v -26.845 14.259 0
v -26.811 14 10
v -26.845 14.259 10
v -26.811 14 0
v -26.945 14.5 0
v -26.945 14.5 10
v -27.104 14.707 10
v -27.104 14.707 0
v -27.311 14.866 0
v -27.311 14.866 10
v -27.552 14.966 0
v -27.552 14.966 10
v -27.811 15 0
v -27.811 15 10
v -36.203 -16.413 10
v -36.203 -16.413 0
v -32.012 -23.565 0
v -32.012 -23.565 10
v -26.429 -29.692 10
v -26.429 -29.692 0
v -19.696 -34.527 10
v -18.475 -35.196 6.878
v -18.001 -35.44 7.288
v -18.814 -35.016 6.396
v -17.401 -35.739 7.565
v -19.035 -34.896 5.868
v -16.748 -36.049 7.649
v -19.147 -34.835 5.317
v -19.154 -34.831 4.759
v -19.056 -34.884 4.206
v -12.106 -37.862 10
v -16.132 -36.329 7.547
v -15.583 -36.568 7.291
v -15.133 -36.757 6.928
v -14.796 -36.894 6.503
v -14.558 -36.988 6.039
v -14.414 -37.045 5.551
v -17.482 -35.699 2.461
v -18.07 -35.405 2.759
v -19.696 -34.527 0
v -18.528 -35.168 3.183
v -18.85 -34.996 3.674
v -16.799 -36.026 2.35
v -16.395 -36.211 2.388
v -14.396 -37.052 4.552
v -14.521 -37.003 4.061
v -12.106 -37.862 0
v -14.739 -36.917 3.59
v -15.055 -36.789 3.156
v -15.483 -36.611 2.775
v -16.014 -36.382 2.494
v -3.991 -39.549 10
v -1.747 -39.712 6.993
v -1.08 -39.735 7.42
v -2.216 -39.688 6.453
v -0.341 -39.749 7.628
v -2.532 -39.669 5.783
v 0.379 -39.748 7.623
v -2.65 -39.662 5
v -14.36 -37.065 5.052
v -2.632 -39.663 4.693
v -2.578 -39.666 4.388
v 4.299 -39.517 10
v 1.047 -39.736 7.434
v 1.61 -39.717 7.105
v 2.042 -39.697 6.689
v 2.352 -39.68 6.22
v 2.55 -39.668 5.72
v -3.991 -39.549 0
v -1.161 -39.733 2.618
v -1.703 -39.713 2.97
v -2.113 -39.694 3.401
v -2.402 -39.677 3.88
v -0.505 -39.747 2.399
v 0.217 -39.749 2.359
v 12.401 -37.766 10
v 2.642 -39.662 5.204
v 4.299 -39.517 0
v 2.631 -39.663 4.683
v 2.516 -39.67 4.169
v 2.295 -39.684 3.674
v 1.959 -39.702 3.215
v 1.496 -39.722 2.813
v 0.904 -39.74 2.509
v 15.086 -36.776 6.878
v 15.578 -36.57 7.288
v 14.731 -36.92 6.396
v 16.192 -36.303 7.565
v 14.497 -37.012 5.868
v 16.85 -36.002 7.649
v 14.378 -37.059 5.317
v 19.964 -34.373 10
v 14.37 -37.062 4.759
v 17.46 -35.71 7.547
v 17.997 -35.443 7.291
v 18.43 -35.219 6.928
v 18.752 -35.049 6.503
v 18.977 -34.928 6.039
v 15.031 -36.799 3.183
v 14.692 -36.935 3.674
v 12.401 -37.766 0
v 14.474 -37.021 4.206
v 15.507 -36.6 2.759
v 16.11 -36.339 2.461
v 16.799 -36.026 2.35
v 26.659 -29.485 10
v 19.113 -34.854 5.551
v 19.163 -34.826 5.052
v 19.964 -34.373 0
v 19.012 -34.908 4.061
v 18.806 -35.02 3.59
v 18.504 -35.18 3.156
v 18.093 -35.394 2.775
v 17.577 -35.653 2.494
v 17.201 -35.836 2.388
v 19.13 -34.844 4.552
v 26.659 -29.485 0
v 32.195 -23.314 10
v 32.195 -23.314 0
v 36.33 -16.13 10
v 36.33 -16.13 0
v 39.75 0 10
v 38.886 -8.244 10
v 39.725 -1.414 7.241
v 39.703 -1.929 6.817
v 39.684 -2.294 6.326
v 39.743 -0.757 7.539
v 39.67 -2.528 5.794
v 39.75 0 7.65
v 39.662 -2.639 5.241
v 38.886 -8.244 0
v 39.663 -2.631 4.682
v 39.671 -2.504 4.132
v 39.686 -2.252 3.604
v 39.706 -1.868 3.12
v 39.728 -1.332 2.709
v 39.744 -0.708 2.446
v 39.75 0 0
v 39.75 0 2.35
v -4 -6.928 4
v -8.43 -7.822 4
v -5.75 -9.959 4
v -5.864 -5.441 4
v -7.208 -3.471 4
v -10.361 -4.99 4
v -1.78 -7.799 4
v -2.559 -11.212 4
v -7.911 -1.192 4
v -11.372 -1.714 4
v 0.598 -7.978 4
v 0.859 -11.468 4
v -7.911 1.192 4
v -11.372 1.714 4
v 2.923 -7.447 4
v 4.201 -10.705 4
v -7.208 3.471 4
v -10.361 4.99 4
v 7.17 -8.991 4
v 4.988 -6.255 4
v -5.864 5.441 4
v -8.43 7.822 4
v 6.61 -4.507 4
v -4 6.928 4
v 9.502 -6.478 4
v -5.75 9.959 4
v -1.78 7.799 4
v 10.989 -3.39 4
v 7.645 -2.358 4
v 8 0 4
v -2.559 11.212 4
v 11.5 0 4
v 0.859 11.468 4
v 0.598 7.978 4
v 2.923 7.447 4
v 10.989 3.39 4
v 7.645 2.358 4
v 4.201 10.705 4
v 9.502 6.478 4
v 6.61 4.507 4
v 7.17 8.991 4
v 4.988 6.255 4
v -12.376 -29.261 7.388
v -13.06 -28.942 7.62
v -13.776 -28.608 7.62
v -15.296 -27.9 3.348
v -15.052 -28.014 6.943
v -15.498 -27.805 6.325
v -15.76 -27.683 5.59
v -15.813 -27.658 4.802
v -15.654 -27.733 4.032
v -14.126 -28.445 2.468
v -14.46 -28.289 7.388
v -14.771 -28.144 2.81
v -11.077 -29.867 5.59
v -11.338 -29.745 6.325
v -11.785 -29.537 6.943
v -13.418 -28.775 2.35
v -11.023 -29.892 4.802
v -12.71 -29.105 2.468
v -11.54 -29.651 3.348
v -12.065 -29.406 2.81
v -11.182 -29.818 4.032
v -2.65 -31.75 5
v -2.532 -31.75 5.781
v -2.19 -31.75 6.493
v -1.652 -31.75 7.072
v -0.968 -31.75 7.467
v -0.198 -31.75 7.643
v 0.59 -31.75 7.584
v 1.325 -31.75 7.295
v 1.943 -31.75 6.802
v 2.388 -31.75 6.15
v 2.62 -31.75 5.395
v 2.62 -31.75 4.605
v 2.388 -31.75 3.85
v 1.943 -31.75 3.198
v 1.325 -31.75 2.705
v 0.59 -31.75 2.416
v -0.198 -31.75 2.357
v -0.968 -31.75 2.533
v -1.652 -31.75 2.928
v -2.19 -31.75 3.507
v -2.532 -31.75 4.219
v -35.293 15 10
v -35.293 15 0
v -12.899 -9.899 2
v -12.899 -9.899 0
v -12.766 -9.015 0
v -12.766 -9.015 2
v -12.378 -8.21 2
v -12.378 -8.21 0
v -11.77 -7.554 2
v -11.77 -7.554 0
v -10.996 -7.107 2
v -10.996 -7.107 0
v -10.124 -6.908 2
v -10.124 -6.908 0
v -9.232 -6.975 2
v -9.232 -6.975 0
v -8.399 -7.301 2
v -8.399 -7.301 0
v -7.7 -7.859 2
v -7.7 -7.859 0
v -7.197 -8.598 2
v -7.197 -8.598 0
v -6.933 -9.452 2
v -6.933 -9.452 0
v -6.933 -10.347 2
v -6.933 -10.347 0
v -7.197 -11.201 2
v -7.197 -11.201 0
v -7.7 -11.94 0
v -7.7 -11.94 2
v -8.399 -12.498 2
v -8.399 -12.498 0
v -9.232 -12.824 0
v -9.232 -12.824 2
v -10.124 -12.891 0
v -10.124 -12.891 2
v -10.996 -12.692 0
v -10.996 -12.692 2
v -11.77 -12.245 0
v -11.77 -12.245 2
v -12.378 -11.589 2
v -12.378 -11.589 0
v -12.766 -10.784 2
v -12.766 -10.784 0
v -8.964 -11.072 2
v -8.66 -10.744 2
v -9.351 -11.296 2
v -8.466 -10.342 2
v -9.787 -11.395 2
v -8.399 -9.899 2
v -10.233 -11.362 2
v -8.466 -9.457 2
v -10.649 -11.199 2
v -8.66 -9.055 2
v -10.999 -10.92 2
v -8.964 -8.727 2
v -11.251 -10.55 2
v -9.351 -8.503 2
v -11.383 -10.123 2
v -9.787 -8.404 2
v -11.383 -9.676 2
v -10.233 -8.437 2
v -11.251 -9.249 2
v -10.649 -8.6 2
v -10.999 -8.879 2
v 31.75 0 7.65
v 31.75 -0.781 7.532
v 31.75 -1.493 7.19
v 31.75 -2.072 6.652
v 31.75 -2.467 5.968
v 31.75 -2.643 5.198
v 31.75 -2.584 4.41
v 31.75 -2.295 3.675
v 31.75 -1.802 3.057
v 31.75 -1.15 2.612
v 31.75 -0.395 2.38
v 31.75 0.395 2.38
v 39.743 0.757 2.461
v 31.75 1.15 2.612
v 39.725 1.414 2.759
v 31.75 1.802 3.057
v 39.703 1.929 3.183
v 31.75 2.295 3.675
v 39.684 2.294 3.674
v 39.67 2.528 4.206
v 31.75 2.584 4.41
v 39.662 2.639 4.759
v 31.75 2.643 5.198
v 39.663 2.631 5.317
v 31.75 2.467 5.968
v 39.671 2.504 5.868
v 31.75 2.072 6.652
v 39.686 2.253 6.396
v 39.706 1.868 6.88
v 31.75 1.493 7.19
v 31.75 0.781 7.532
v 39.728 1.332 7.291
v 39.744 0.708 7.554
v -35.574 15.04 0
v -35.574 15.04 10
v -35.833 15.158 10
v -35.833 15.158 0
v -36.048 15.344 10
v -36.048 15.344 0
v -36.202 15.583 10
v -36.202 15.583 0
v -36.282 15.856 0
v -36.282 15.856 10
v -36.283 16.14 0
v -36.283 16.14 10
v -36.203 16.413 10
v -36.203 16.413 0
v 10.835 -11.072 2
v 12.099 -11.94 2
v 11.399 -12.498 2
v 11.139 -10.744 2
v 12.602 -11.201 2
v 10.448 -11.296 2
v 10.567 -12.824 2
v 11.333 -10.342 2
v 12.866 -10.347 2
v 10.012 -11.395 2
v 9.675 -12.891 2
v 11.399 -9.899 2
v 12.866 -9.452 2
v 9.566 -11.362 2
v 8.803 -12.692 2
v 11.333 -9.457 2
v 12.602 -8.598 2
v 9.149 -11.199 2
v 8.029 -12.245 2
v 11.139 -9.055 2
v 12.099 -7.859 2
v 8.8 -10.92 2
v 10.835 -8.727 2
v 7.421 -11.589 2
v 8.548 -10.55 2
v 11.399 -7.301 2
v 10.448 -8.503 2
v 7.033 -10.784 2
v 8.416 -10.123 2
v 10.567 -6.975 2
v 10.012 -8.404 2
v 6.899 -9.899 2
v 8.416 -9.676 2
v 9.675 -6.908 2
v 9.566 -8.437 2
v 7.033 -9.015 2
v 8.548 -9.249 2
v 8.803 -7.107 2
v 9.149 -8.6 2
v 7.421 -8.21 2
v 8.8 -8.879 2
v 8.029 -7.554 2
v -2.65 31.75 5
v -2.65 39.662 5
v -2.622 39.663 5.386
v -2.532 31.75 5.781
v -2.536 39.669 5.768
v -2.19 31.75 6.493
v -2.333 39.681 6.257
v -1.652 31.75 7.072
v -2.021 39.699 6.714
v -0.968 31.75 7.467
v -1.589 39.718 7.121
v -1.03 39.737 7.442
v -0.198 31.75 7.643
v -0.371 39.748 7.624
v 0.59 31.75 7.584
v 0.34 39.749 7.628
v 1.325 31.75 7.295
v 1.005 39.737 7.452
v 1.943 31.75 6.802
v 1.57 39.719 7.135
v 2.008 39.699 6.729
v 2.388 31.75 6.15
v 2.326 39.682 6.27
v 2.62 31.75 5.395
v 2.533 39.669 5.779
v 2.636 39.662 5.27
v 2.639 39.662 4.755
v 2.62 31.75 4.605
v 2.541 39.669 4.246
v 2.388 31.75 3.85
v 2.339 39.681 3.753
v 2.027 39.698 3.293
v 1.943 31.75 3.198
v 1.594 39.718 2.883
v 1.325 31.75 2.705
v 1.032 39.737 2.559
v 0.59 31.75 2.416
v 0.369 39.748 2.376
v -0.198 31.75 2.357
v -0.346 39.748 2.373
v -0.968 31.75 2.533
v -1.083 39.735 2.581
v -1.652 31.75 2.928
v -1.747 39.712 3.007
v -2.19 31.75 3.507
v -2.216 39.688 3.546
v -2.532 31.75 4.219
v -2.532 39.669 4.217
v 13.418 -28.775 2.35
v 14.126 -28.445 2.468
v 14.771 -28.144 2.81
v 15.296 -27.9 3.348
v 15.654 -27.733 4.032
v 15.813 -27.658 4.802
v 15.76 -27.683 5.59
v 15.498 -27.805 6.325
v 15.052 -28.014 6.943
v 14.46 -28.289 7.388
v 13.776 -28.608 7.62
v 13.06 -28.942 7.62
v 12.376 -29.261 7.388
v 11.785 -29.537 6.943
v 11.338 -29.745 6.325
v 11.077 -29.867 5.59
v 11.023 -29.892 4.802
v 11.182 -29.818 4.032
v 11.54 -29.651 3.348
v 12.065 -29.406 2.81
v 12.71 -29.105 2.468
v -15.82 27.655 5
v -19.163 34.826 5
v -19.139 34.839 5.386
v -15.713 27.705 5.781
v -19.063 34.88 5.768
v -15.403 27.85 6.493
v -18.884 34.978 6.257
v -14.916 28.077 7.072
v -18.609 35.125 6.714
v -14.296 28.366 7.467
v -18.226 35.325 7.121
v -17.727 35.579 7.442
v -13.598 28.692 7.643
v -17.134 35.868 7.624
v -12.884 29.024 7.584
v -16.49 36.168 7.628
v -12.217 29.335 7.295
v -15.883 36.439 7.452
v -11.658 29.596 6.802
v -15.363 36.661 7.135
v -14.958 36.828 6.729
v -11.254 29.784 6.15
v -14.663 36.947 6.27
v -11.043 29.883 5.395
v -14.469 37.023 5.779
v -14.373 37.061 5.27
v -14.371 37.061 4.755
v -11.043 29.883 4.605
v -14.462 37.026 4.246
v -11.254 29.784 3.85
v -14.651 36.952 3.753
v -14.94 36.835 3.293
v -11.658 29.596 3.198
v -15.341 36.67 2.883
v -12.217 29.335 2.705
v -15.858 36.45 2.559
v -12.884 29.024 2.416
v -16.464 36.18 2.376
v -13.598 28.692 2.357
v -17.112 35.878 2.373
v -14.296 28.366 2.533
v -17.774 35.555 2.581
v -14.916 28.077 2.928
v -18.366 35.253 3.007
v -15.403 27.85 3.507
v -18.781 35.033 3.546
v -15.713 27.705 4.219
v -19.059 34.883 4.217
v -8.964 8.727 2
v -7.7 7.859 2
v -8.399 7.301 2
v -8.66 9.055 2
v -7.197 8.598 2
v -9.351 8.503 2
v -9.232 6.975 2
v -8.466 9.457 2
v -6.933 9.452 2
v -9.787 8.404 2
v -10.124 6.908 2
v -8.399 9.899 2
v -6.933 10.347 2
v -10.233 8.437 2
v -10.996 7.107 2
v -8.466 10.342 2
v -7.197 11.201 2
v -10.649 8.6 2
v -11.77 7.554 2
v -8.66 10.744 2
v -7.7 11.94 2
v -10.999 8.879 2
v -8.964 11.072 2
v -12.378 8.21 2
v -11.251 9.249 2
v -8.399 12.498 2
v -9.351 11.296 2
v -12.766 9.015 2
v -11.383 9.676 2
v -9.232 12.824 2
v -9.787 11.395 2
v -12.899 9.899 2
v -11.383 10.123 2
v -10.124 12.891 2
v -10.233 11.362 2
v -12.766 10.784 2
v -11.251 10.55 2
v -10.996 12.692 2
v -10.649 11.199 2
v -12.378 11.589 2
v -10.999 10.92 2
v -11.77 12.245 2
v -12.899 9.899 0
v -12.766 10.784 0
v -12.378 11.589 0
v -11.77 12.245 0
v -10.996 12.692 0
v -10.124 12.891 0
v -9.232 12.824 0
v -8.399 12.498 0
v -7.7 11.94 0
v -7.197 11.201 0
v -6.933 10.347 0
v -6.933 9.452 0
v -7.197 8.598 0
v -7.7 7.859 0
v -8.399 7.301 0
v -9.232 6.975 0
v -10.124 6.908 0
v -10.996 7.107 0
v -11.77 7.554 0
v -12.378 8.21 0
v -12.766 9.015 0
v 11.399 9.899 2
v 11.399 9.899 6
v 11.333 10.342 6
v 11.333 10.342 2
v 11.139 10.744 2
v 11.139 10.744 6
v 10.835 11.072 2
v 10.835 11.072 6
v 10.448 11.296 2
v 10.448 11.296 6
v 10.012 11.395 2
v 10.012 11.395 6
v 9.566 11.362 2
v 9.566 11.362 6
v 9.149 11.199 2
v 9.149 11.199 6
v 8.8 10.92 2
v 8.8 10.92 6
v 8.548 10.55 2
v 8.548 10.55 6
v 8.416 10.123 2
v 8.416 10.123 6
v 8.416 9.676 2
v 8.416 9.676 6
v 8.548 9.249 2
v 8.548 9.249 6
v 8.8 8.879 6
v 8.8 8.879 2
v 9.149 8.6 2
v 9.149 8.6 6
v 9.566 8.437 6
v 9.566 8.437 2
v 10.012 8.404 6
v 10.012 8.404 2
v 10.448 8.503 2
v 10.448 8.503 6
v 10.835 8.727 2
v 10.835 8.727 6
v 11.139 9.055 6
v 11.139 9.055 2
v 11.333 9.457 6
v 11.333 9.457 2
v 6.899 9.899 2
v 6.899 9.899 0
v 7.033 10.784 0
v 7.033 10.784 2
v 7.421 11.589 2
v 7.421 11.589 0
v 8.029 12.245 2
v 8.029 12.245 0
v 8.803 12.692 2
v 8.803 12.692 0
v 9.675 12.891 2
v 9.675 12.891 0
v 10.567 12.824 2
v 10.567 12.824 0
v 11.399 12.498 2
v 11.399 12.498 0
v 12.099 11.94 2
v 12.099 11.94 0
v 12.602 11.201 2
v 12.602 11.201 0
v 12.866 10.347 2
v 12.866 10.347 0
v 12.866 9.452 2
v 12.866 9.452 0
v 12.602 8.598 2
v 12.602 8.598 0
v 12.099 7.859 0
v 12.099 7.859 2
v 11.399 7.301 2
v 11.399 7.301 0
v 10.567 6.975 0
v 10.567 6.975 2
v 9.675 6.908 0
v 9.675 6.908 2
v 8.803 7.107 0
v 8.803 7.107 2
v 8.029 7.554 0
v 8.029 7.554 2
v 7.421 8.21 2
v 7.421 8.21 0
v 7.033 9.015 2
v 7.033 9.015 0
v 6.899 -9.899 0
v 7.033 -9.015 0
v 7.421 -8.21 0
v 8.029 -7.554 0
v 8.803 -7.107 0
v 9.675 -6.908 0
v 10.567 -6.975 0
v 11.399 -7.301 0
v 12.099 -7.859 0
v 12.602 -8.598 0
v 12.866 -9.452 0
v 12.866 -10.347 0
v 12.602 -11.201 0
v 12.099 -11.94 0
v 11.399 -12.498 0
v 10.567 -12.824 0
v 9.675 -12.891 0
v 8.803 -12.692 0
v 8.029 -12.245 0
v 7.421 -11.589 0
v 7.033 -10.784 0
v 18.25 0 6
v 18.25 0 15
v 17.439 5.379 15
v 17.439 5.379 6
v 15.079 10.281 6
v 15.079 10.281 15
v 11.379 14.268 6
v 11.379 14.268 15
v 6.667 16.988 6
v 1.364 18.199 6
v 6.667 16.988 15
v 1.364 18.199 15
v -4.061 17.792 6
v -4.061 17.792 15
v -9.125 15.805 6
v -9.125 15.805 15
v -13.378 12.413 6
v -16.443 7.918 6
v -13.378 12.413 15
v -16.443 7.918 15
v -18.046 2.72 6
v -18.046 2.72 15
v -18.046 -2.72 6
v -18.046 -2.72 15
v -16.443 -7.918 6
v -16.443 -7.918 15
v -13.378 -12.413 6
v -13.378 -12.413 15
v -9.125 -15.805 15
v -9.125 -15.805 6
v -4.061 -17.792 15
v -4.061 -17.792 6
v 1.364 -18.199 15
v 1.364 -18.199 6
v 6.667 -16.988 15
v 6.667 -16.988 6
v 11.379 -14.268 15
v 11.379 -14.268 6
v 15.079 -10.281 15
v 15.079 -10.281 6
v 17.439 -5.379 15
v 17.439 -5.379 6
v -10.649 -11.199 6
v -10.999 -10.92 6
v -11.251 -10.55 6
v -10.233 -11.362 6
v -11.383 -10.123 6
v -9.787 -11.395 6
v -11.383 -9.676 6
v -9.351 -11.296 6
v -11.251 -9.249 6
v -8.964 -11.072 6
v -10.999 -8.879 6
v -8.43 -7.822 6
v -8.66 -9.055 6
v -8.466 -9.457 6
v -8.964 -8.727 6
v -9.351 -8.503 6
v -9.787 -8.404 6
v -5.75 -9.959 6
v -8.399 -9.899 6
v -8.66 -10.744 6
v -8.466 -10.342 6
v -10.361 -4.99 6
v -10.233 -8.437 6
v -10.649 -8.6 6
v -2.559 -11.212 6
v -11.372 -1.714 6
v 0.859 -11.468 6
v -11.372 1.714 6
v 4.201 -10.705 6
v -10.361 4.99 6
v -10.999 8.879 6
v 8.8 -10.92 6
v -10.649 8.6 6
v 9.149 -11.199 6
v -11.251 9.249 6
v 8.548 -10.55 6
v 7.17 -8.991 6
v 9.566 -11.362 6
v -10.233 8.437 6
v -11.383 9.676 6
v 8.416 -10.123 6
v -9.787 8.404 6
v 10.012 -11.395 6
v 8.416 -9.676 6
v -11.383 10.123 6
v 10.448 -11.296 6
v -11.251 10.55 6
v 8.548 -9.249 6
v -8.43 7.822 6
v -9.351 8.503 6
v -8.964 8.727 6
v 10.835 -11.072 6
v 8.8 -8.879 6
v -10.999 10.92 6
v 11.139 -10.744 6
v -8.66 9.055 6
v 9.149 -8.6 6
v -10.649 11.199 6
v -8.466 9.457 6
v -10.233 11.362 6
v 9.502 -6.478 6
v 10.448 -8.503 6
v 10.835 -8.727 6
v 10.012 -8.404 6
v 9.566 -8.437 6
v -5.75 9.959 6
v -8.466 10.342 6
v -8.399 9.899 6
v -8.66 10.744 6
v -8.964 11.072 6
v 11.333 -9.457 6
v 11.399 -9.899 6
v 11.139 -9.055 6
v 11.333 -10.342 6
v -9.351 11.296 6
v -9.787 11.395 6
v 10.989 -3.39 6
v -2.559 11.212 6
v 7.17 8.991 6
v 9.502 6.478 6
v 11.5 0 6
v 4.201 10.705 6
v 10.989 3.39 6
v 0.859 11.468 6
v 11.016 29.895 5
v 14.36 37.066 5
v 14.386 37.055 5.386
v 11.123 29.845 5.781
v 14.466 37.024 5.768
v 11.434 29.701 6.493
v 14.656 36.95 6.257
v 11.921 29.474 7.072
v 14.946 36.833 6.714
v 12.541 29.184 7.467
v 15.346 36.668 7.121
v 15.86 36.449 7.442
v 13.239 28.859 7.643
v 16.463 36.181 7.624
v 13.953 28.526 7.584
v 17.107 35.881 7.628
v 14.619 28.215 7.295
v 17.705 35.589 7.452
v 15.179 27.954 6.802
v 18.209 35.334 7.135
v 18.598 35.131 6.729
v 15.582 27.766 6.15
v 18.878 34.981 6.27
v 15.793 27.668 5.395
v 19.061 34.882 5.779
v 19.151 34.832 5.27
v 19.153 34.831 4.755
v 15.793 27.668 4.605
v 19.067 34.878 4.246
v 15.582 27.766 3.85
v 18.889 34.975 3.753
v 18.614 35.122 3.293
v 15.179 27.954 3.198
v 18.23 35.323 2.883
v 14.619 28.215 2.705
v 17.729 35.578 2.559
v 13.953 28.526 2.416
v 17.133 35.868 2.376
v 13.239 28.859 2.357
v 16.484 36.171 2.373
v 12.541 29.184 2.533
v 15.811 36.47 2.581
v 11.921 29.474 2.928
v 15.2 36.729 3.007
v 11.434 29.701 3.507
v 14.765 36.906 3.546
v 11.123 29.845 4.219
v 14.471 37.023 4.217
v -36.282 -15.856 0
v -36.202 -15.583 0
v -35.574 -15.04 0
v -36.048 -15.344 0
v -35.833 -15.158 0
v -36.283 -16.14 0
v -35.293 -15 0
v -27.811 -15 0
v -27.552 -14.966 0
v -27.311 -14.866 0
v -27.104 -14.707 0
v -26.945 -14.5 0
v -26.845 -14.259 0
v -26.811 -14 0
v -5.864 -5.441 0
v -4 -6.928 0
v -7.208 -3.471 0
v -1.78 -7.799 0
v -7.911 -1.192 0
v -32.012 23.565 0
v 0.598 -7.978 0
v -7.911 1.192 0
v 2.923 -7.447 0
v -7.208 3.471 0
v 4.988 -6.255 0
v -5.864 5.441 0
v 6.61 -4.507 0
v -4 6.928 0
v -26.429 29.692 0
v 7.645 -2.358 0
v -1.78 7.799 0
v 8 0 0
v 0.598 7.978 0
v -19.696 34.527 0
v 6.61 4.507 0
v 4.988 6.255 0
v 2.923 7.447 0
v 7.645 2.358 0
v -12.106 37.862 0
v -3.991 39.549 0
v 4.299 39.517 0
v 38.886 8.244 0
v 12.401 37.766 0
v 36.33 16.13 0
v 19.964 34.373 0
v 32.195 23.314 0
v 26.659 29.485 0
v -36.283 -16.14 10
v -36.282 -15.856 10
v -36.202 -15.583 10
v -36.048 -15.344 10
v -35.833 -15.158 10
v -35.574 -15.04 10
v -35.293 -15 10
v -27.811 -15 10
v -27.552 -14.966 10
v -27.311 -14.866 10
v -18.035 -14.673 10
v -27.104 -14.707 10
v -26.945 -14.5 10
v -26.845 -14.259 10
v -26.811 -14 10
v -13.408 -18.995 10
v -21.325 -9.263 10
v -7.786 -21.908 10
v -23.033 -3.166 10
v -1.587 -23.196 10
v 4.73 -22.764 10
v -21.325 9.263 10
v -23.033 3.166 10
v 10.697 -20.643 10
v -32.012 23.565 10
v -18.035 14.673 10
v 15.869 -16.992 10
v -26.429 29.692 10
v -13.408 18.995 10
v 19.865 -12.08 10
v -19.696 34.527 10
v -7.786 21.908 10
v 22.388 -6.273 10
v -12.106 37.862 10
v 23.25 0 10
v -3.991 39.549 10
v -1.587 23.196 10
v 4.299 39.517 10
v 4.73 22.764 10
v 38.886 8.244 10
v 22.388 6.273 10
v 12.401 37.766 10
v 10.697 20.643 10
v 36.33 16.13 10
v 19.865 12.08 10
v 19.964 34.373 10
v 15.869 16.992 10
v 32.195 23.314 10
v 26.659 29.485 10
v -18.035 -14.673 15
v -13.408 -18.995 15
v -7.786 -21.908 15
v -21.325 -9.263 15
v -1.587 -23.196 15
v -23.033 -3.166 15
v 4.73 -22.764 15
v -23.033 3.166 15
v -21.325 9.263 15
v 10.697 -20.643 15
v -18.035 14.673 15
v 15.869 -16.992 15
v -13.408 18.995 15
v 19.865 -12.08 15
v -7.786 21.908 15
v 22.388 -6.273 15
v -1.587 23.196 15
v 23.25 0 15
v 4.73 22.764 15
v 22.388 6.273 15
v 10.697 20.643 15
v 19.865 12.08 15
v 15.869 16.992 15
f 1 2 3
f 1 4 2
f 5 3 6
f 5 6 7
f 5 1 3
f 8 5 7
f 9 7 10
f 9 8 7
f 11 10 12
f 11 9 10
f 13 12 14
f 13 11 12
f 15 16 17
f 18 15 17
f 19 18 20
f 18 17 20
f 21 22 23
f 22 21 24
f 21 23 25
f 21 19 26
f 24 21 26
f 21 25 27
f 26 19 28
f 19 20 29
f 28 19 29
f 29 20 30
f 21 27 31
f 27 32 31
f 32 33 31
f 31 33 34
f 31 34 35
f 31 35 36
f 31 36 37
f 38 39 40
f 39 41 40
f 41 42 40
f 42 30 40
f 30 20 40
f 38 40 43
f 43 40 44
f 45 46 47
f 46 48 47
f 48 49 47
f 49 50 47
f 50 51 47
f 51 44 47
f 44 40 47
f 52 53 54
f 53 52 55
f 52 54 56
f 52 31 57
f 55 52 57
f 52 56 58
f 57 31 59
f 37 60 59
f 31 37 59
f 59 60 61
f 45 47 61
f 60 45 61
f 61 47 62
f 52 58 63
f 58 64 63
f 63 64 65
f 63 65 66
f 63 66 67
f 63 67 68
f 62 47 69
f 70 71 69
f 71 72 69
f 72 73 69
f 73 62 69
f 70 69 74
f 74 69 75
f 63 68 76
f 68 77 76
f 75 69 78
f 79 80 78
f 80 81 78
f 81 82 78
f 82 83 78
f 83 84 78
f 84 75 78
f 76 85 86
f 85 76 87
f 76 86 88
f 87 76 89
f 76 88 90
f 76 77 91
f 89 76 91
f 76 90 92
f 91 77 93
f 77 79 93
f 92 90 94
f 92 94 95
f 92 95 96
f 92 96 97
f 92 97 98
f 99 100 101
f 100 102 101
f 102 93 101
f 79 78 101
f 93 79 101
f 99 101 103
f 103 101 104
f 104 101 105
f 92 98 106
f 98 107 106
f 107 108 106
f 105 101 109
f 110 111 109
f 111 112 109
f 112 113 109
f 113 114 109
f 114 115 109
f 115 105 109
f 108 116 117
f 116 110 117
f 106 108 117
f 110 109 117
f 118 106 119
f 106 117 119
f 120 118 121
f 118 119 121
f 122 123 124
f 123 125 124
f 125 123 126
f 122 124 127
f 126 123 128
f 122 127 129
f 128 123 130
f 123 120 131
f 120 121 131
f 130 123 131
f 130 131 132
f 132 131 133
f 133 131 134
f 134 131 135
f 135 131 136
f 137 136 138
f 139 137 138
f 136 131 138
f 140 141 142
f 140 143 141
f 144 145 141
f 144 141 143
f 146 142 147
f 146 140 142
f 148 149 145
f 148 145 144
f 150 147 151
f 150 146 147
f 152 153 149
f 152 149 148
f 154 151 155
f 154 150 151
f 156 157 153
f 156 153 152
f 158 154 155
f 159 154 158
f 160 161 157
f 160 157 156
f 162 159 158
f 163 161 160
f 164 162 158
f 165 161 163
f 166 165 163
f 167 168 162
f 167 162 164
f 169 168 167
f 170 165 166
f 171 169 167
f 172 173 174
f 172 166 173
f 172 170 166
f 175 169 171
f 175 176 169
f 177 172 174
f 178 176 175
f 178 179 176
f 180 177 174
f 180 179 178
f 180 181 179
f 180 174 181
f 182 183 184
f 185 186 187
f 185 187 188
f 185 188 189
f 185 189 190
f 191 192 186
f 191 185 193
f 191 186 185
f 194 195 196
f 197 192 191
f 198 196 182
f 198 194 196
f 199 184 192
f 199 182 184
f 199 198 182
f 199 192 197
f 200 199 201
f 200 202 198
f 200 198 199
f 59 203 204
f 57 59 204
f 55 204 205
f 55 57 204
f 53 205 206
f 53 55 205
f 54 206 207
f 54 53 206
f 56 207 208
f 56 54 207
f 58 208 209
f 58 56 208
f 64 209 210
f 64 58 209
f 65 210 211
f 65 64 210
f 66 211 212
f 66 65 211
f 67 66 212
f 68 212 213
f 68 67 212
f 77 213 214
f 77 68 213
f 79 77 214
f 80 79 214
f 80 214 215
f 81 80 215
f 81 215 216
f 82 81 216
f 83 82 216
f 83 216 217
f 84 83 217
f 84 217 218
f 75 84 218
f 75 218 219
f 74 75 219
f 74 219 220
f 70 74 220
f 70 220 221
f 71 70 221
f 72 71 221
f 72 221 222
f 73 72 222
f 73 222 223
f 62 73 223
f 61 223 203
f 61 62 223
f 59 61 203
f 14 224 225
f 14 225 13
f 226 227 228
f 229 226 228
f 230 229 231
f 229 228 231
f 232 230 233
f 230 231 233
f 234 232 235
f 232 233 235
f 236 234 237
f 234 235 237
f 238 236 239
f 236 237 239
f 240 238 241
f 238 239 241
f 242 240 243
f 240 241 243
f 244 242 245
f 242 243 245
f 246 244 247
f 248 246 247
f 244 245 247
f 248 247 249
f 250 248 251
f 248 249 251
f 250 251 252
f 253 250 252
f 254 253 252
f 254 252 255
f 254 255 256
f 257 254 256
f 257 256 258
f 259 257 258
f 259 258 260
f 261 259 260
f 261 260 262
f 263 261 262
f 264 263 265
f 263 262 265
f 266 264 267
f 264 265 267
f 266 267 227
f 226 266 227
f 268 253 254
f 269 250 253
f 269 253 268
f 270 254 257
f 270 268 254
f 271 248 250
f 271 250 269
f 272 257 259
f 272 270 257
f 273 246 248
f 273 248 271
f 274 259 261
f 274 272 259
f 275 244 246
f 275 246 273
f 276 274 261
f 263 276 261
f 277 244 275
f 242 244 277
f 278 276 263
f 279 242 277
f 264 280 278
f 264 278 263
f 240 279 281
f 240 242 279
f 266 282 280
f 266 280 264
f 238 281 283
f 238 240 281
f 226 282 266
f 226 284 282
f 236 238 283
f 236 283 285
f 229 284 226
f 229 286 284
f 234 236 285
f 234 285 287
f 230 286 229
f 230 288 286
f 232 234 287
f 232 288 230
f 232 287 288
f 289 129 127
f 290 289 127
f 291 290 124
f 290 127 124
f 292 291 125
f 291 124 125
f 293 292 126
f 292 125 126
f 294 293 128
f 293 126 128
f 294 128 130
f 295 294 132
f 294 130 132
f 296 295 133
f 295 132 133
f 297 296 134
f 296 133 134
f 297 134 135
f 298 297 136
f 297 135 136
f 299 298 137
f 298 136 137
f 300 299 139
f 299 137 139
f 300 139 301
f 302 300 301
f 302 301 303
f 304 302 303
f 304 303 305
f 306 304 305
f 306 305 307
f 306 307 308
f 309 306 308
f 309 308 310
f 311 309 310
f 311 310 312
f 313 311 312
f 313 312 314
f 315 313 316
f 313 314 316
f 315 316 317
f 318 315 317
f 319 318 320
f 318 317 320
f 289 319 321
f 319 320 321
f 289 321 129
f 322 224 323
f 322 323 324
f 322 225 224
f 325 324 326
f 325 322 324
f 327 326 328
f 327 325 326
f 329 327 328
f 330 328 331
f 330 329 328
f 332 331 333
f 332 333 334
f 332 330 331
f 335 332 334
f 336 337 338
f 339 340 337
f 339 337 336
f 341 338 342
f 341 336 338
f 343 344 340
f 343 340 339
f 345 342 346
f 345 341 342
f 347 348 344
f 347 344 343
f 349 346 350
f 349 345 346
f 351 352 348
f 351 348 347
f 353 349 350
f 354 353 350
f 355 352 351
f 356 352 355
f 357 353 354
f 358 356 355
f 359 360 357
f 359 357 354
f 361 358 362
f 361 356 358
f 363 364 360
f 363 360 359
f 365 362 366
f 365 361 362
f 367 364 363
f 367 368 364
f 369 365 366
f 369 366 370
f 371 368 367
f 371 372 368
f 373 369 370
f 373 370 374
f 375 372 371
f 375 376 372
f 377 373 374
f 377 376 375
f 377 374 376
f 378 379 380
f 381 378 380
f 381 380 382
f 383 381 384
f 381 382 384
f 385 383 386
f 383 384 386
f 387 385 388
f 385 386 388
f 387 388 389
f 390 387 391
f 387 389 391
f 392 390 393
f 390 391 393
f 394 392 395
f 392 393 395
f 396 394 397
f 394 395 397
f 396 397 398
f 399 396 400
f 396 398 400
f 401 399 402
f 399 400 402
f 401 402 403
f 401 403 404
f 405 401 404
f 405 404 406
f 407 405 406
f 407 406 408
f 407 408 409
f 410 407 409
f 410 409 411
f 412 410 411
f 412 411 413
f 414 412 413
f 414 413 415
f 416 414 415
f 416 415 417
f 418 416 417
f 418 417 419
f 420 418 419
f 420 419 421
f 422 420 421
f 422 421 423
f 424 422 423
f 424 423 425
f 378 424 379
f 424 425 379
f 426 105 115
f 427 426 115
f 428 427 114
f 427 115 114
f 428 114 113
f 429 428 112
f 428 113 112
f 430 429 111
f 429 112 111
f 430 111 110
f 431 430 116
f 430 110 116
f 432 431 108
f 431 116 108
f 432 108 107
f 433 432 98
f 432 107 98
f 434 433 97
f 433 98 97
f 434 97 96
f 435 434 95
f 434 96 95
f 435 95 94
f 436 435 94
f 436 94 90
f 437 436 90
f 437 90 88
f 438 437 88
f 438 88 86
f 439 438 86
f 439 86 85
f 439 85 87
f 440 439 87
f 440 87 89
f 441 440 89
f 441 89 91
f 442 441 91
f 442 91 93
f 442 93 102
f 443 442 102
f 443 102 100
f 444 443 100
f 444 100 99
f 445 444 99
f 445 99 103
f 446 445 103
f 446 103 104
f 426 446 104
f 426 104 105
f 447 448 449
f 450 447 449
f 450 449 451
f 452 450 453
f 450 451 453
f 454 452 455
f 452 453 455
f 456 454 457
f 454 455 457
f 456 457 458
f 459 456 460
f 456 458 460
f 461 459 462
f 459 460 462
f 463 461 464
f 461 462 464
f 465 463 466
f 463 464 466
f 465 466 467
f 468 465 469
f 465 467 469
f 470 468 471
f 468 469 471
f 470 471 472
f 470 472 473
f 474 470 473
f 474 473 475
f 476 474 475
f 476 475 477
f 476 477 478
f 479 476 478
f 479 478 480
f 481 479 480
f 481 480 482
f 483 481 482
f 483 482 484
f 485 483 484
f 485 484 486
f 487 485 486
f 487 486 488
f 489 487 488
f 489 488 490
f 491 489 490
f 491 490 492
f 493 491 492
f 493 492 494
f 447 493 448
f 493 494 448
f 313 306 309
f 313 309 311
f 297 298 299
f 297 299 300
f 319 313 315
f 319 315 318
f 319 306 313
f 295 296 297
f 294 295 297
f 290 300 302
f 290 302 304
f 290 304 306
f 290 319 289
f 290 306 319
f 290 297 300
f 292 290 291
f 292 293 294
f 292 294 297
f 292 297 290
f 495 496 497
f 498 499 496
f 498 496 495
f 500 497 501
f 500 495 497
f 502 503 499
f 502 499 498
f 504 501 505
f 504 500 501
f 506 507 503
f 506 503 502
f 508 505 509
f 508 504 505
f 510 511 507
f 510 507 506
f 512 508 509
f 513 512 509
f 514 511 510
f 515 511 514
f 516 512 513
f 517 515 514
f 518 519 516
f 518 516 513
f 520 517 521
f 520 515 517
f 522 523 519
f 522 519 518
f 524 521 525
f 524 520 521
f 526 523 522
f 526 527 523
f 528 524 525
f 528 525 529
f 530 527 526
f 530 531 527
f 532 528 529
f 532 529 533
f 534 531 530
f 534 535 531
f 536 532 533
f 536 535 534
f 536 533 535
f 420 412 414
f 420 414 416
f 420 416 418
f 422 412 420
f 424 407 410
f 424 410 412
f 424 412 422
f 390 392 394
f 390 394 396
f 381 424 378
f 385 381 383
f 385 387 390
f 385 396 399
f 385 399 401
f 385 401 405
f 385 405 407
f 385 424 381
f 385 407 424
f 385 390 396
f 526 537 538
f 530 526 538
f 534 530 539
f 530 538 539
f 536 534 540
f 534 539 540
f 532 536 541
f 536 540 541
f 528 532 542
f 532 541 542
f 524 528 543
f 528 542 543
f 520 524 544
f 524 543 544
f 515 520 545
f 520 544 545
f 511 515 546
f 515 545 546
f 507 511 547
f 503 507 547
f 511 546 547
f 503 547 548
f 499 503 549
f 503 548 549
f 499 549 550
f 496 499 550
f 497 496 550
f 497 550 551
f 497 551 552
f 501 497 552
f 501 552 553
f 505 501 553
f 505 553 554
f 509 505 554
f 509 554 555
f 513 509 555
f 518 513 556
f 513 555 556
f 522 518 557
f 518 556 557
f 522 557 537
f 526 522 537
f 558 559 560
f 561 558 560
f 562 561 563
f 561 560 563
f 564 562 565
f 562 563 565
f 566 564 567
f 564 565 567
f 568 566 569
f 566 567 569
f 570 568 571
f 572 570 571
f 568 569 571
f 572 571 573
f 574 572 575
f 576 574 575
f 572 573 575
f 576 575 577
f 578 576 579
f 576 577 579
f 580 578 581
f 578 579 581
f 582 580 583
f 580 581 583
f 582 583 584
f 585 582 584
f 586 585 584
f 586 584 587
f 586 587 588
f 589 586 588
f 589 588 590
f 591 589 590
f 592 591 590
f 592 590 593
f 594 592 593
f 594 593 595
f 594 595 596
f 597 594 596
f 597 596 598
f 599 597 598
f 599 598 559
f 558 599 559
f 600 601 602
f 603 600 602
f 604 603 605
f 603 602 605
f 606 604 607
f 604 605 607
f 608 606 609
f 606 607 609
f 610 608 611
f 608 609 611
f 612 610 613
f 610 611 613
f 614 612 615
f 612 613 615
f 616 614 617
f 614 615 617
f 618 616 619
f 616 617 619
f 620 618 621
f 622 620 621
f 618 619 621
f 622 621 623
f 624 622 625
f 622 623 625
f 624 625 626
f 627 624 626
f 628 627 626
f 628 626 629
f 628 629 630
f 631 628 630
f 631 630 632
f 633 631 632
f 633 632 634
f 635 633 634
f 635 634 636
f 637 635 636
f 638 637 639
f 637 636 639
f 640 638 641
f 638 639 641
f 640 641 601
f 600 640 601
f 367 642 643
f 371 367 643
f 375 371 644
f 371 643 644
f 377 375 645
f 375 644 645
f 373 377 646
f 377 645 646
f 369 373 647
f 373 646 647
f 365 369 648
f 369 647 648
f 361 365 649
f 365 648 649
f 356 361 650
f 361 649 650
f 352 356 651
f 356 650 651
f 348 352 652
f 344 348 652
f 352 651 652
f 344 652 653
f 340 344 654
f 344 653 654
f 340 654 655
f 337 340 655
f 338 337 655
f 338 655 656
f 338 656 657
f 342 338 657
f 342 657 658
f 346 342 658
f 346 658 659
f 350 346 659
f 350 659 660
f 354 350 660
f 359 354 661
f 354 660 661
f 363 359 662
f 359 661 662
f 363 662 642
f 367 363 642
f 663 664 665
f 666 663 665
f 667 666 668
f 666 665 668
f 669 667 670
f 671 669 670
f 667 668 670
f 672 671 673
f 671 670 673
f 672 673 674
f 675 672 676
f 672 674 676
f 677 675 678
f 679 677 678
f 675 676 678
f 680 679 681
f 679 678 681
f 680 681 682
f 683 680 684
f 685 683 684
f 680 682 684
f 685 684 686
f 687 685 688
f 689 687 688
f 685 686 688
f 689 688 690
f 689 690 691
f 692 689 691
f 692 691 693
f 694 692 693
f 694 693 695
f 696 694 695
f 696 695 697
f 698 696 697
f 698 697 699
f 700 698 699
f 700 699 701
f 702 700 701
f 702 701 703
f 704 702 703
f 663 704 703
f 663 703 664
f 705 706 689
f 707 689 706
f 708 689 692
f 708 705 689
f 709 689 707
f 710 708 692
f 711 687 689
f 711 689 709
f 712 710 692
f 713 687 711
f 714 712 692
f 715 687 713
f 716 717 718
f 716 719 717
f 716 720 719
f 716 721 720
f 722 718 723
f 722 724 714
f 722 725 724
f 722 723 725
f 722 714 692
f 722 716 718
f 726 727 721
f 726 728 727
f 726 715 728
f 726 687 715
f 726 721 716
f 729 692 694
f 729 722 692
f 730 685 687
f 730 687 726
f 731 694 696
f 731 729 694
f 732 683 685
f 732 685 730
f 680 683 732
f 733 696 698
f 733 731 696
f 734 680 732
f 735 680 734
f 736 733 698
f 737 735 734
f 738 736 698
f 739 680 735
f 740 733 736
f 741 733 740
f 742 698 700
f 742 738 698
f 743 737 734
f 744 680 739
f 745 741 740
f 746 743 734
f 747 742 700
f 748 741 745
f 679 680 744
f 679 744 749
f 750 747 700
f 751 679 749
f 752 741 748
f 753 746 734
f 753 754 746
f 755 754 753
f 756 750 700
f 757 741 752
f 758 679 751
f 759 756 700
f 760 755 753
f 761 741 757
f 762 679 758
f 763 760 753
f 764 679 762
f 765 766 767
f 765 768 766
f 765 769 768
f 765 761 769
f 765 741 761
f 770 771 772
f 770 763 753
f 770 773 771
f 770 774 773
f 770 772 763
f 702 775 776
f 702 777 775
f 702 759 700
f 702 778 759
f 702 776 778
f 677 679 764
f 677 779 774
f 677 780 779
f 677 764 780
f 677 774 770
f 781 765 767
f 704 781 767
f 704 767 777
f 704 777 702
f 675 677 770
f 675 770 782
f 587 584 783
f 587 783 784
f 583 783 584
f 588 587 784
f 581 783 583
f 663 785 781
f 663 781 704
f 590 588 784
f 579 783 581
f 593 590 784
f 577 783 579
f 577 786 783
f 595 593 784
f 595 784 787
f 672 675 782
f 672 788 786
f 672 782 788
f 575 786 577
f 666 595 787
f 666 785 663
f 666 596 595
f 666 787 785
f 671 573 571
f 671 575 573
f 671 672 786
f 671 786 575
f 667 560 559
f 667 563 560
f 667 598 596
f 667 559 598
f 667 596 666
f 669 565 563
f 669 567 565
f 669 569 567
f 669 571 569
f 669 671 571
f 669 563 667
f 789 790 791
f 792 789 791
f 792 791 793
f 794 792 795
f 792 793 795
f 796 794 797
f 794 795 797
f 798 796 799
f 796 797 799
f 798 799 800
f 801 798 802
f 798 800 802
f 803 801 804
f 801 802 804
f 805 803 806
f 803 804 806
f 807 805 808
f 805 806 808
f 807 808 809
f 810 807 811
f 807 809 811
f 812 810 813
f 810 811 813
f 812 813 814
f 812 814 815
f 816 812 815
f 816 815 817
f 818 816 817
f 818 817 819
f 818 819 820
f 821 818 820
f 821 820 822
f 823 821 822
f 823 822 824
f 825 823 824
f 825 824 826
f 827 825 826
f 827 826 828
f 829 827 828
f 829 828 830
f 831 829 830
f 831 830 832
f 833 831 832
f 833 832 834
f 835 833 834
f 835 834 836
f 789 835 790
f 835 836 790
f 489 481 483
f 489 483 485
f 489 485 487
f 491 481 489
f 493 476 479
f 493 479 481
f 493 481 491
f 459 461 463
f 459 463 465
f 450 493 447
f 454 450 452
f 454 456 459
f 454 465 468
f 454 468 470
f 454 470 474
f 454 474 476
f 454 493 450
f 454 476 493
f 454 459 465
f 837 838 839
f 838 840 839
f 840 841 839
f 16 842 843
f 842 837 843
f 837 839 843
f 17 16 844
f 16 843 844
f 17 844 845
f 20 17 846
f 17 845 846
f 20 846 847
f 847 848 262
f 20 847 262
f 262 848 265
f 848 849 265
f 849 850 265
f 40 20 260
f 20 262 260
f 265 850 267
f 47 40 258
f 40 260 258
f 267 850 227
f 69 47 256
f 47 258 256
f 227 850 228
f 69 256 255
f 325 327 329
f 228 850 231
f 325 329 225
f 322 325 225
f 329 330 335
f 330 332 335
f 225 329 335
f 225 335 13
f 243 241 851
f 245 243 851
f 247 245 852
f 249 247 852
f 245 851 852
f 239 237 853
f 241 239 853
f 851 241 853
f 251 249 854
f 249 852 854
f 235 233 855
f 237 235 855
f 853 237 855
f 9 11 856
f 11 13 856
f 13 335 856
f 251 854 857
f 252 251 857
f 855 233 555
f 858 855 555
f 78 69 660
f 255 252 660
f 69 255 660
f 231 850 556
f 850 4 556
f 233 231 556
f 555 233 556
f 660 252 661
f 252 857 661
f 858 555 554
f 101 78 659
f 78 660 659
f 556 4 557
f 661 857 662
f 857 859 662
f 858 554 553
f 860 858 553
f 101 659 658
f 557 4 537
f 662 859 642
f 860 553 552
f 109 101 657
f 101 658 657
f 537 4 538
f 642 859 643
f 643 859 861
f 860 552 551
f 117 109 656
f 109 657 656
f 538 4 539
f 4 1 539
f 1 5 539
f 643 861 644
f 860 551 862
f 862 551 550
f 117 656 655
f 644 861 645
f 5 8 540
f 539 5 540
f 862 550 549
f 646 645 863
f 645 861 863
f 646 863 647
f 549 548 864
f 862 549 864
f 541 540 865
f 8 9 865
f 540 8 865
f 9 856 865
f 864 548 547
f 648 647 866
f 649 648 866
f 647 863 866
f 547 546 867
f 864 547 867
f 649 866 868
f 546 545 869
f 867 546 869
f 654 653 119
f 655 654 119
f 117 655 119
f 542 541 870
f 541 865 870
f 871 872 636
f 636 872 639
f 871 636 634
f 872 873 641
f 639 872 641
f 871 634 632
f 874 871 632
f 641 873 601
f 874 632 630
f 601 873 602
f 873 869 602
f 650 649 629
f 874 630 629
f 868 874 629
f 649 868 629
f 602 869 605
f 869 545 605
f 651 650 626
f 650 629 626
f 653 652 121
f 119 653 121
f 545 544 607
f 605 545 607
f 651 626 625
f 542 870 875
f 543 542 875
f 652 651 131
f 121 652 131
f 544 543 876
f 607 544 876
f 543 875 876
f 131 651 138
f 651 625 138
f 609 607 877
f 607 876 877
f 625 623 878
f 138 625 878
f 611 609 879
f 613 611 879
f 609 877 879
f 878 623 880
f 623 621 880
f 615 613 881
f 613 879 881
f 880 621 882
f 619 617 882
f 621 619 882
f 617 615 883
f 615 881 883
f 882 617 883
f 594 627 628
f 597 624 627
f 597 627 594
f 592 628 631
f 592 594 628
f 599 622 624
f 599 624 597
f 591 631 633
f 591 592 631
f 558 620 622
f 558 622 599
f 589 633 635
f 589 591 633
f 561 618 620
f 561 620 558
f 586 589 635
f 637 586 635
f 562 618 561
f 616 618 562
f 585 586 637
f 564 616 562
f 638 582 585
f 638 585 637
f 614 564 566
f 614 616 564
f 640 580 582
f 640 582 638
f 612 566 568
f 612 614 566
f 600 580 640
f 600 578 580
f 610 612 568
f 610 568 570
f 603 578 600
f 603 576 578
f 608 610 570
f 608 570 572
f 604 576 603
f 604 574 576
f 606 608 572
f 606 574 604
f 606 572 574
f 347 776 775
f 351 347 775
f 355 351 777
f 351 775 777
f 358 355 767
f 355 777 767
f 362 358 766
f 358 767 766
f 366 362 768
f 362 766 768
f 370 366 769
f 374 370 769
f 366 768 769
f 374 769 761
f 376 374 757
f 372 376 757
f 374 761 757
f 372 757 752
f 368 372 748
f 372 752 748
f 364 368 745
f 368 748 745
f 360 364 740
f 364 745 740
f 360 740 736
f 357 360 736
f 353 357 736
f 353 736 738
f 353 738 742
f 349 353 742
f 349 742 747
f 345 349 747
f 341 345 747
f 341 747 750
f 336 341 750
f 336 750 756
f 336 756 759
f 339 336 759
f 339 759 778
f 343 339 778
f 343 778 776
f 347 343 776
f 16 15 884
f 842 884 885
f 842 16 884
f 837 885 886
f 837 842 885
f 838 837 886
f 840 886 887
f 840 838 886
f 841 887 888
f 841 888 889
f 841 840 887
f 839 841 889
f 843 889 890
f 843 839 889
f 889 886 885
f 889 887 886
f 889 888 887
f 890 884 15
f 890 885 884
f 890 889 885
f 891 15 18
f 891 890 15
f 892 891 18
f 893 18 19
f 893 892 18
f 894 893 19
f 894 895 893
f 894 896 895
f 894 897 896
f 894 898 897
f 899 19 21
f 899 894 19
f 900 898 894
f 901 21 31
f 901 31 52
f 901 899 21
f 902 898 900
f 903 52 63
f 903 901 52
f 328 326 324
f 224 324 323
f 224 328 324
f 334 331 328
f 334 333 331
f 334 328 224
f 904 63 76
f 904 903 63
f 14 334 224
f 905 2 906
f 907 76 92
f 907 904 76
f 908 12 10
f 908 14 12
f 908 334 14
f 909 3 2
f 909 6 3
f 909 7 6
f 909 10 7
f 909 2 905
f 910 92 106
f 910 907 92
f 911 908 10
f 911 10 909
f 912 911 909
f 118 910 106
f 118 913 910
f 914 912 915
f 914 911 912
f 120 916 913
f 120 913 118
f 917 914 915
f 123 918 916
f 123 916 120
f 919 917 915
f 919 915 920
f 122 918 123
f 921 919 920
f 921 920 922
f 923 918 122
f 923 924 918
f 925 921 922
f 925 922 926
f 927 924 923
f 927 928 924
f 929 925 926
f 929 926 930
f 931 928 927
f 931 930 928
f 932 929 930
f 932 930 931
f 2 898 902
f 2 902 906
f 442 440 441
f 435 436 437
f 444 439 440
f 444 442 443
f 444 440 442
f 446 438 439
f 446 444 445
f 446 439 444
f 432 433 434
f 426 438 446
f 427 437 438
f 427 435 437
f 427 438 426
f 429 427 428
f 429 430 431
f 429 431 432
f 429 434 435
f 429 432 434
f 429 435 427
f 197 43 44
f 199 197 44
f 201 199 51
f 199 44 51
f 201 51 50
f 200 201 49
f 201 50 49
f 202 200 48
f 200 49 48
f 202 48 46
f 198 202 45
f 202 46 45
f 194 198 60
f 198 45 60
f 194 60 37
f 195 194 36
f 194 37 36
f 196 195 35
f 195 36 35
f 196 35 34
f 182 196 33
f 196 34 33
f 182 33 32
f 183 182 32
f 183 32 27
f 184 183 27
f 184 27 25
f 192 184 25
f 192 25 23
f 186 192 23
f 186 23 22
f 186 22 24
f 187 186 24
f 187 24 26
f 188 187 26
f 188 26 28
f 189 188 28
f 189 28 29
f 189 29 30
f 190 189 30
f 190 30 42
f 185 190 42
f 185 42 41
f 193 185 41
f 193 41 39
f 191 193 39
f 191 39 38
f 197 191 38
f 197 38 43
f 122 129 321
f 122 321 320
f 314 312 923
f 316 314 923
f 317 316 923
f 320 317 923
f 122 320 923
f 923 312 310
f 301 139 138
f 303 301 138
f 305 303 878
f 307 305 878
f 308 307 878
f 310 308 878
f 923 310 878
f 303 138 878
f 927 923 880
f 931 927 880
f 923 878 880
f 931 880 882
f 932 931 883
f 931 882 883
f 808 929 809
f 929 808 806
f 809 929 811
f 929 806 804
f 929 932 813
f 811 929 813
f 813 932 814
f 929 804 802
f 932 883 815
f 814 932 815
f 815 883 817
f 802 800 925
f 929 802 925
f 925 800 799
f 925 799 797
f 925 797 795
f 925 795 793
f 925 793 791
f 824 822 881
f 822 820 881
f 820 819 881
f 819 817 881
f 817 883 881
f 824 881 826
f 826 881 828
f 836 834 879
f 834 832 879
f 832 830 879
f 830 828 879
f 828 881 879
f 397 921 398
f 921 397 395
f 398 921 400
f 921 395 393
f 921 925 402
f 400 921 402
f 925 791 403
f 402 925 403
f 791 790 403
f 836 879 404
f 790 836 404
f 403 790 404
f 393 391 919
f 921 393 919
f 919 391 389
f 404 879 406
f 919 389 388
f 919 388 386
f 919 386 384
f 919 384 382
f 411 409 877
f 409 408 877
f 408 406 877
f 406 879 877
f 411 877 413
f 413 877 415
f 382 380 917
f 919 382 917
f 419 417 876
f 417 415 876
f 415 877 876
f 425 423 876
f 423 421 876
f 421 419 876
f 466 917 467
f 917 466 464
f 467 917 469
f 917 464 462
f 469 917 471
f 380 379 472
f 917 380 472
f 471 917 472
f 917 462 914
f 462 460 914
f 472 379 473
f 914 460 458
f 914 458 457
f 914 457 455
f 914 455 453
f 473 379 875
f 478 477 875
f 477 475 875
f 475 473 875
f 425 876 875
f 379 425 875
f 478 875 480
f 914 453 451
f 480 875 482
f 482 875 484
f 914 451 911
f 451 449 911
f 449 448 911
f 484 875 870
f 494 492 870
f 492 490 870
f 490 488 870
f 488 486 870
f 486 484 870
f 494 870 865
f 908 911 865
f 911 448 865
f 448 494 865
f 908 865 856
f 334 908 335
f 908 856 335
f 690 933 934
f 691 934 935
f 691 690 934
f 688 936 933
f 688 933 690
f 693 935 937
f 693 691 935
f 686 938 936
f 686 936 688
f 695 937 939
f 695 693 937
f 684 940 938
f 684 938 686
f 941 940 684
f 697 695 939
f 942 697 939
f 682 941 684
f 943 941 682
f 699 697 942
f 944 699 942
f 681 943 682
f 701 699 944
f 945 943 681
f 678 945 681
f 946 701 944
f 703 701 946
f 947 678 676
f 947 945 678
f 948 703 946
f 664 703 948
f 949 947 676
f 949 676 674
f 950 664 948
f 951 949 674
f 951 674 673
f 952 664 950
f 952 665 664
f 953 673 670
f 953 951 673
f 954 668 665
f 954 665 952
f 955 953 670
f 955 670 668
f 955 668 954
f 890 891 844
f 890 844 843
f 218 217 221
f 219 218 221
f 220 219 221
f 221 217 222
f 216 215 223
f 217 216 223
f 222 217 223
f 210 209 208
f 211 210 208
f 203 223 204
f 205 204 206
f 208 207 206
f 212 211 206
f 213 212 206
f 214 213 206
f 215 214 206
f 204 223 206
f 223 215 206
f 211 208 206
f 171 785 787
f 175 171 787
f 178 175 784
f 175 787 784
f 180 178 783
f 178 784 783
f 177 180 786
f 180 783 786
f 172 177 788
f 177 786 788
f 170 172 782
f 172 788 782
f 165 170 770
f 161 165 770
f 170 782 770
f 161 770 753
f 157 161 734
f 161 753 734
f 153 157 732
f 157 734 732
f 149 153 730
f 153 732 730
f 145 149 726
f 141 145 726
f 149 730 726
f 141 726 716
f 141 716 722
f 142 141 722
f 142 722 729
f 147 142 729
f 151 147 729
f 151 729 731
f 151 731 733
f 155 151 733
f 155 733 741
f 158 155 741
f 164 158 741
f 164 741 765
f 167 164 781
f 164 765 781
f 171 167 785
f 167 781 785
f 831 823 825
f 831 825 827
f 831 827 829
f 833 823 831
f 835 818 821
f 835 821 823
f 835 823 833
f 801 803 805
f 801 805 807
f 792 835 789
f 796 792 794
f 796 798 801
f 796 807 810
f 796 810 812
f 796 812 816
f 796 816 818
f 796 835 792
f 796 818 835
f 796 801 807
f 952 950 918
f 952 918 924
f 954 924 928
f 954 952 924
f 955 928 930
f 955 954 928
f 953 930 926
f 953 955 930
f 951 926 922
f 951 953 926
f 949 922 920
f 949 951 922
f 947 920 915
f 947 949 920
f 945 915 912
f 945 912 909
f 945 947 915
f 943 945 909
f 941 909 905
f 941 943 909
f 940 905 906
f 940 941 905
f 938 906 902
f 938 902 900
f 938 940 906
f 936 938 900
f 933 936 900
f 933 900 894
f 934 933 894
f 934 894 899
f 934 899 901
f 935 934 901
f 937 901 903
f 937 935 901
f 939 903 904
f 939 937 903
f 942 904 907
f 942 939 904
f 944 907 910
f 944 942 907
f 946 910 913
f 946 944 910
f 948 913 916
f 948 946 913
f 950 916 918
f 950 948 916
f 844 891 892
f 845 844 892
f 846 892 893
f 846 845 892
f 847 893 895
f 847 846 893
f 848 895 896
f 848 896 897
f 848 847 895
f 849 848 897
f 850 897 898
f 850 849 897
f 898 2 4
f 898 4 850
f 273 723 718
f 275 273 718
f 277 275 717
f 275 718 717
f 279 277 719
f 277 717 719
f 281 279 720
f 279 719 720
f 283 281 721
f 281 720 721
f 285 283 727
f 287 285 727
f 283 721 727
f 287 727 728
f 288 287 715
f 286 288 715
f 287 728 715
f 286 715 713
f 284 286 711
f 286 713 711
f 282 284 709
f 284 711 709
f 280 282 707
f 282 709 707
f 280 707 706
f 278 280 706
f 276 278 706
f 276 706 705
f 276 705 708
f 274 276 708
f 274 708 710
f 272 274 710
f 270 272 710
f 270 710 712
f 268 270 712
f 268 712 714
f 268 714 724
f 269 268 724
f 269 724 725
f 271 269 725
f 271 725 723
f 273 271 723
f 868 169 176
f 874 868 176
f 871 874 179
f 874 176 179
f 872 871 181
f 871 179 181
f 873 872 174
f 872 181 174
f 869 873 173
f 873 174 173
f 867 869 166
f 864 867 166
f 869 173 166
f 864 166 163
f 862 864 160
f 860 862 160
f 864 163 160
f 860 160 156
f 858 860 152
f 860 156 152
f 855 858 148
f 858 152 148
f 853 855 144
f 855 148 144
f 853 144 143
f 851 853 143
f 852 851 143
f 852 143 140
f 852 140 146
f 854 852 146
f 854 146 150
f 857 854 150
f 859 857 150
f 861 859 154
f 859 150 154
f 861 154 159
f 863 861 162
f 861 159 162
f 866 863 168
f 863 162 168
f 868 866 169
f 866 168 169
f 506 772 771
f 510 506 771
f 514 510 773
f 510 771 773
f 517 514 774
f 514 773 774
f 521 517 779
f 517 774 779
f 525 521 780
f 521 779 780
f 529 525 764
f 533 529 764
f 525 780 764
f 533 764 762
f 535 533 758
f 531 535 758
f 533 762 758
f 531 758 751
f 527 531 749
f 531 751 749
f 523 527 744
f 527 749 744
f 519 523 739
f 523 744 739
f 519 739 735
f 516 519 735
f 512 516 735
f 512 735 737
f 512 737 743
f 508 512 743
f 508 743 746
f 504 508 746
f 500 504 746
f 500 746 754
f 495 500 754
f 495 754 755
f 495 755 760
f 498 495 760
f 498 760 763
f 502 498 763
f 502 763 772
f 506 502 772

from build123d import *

# Parameters (mm, degrees)
SKETCH_1_R               = 39.75
EXTRUDE_1_DEPTH          = 10
SKETCH_2_R               = 18.25
CUT_EXTRUDE_1_DEPTH      = 4
SKETCH_3_R               = 11.5
CUT_EXTRUDE_2_DEPTH      = 2
SKETCH_4_R               = 1.5
CUT_EXTRUDE_3_DEPTH      = 6
SKETCH_5_R               = 3
CUT_EXTRUDE_4_DEPTH      = 2
SKETCH_7_R               = 2.65
CUT_EXTRUDE_5_DEPTH      = 8
PATTERN_CIRCULAR_1_COUNT = 2
PATTERN_CIRCULAR_1_ANGLE = 25
F_1_THE_OTHER_WAY_COUNT  = 2
F_1_THE_OTHER_WAY_ANGLE  = 25
MIRROR_1_COPY_1_SKETCH_R = 2.65
MIRROR_1_COPY_1_DEPTH    = 8
MIRROR_1_COPY_2_SKETCH_R = 2.65
MIRROR_1_COPY_2_DEPTH    = 8
SKETCH_8_R               = 8
CUT_EXTRUDE_6_DEPTH      = 4
SKETCH_9_R               = 2.65
CUT_EXTRUDE_7_DEPTH      = 8
PATTERN_CIRCULAR_2_COUNT = 2
EXTRUDE_START            = 5
SKETCH_10_R              = 23.25
SKETCH_10_R_2            = 18.25
EXTRUDE_2_DEPTH          = 5
CUT_EXTRUDE_START        = -10
CUT_EXTRUDE_8_DEPTH      = 10
FILLET_1_R               = 1


# Read off the part's stored shape, not the designer's step: Вырез-Вытянуть8
with BuildPart() as part:
    # Эскиз1 → Бобышка-Вытянуть1 (new body)
    with BuildSketch(Plane.XY):
        Circle(SKETCH_1_R)
    extrude(amount=EXTRUDE_1_DEPTH)

    # Эскиз2 → Вырез-Вытянуть1 (cut)
    with BuildSketch(Plane.XY.offset(10)):
        Circle(SKETCH_2_R)
    extrude(amount=-CUT_EXTRUDE_1_DEPTH, mode=Mode.SUBTRACT)

    # Эскиз3 → Вырез-Вытянуть2 (cut)
    with BuildSketch(Plane.XY.offset(6)):
        Circle(SKETCH_3_R)
    extrude(amount=-CUT_EXTRUDE_2_DEPTH, mode=Mode.SUBTRACT)

    # Эскиз4 → Вырез-Вытянуть3 (cut)
    with BuildSketch(Plane.XY.offset(6)):
        with Locations((-9.899494937, 9.899494937)):
            Circle(SKETCH_4_R)
        with Locations((9.899494937, 9.899494937)):
            Circle(SKETCH_4_R)
        with Locations((9.899494937, -9.899494937)):
            Circle(SKETCH_4_R)
        with Locations((-9.899494937, -9.899494937)):
            Circle(SKETCH_4_R)
    extrude(amount=-CUT_EXTRUDE_3_DEPTH, mode=Mode.SUBTRACT)

    # Эскиз5 → Вырез-Вытянуть4 (cut)
    with BuildSketch(Plane(origin=(0, 0, 0), x_dir=(-1, 0, 0), z_dir=(0, 0, -1))):
        with Locations((-9.899494937, 9.899494937)):
            Circle(SKETCH_5_R)
        with Locations((9.899494937, 9.899494937)):
            Circle(SKETCH_5_R)
        with Locations((9.899494937, -9.899494937)):
            Circle(SKETCH_5_R)
        with Locations((-9.899494937, -9.899494937)):
            Circle(SKETCH_5_R)
    extrude(amount=-CUT_EXTRUDE_4_DEPTH, mode=Mode.SUBTRACT)

    # Эскиз7 → Вырез-Вытянуть5 (cut)
    with BuildSketch(Plane(origin=(0, 39.75, 0), x_dir=(0, 0, -1), z_dir=(0, 1, 0))):
        with Locations(Location((-5, 0, 0), (0, 0, 90))):
            Circle(SKETCH_7_R)
    cut_extrude_5 = extrude(amount=-CUT_EXTRUDE_5_DEPTH, mode=Mode.SUBTRACT)

    # Круговой массив1: Вырез-Вытянуть5 ×2 about axis
    pattern_circular_1_axis = Axis((0, 0, 10), (0, 0, -1))
    for i in range(1, PATTERN_CIRCULAR_1_COUNT):
        add(cut_extrude_5.rotate(pattern_circular_1_axis, i * PATTERN_CIRCULAR_1_ANGLE / (PATTERN_CIRCULAR_1_COUNT - 1)), mode=Mode.SUBTRACT)

    # 1 the other way: Вырез-Вытянуть5 ×2 about axis
    f_1_the_other_way_axis = Axis((0, 0, 10), (0, 0, 1))
    for i in range(1, F_1_THE_OTHER_WAY_COUNT):
        add(cut_extrude_5.rotate(f_1_the_other_way_axis, i * F_1_THE_OTHER_WAY_ANGLE / (F_1_THE_OTHER_WAY_COUNT - 1)), mode=Mode.SUBTRACT)

    # Зеркальное отражение1: Вырез-Вытянуть5 across plane
    add(cut_extrude_5.mirror(Plane.ZX), mode=Mode.SUBTRACT)

    # Зеркальное отражение1 copy 1 sketch → Зеркальное отражение1 copy 1 (cut)
    with BuildSketch(Plane(origin=(16.799075904, -36.025734535, 0), x_dir=(0, 0, -1), z_dir=(0.4226182617407035, -0.906307787036648, 0))):
        with Locations((-5, 0)):
            Circle(MIRROR_1_COPY_1_SKETCH_R)
    extrude(amount=-MIRROR_1_COPY_1_DEPTH, mode=Mode.SUBTRACT)

    # Зеркальное отражение1 copy 2 sketch → Зеркальное отражение1 copy 2 (cut)
    with BuildSketch(Plane(origin=(-16.799075904, -36.025734535, 0), x_dir=(0, 0, -1), z_dir=(-0.42261826174069717, -0.9063077870366509, 0))):
        with Locations((-5, 0)):
            Circle(MIRROR_1_COPY_2_SKETCH_R)
    extrude(amount=-MIRROR_1_COPY_2_DEPTH, mode=Mode.SUBTRACT)

    # Эскиз8 → Вырез-Вытянуть6 (cut)
    with BuildSketch(Plane.XY.offset(4)):
        Circle(SKETCH_8_R)
    extrude(amount=-CUT_EXTRUDE_6_DEPTH, mode=Mode.SUBTRACT)

    # Эскиз9 → Вырез-Вытянуть7 (cut)
    with BuildSketch(Plane.ZY.offset(39.75)):
        with Locations((5, 0)):
            Circle(SKETCH_9_R)
    cut_extrude_7 = extrude(amount=-CUT_EXTRUDE_7_DEPTH, mode=Mode.SUBTRACT)

    # Круговой массив2: Вырез-Вытянуть7 ×2 about axis
    pattern_circular_2_axis = Axis((0, 0, 10), (0, 0, -1))
    for i in range(1, PATTERN_CIRCULAR_2_COUNT):
        add(cut_extrude_7.rotate(pattern_circular_2_axis, i * 360 / PATTERN_CIRCULAR_2_COUNT), mode=Mode.SUBTRACT)

    # Эскиз10 → Бобышка-Вытянуть2 (add)
    with BuildSketch(Plane.XY.offset(10).offset(EXTRUDE_START)):
        Circle(SKETCH_10_R)
        Circle(SKETCH_10_R_2, mode=Mode.SUBTRACT)
    extrude(amount=-EXTRUDE_2_DEPTH)

    # Вырез-Вытянуть8 outline → Вырез-Вытянуть8 (cut)
    with BuildSketch(Plane(origin=(0, 0, 0), x_dir=(-1, 0, 0), z_dir=(0, 0, -1)).offset(CUT_EXTRUDE_START)):
        with BuildLine():
            Line((36.811173575, 15), (26.811173575, 15))
            Line((26.811173575, 15), (26.811173575, -15))
            Line((26.811173575, -15), (36.811173575, -15))
            ThreePointArc((36.811173575, -15), (39.75, 0), (36.811173575, 15))
        make_face()
    extrude(amount=CUT_EXTRUDE_8_DEPTH, mode=Mode.SUBTRACT)

    # Скругление1
    fillet_1_edges = [part.edges().sort_by_distance(p)[0] for p in [
        (-26.811173575, 15, 5),
        (-26.811173575, -15, 5),
        (-36.811173575, -15, 5),
        (-36.811173575, 15, 5),
    ]]
    fillet(fillet_1_edges, radius=FILLET_1_R)


solid = part.part
